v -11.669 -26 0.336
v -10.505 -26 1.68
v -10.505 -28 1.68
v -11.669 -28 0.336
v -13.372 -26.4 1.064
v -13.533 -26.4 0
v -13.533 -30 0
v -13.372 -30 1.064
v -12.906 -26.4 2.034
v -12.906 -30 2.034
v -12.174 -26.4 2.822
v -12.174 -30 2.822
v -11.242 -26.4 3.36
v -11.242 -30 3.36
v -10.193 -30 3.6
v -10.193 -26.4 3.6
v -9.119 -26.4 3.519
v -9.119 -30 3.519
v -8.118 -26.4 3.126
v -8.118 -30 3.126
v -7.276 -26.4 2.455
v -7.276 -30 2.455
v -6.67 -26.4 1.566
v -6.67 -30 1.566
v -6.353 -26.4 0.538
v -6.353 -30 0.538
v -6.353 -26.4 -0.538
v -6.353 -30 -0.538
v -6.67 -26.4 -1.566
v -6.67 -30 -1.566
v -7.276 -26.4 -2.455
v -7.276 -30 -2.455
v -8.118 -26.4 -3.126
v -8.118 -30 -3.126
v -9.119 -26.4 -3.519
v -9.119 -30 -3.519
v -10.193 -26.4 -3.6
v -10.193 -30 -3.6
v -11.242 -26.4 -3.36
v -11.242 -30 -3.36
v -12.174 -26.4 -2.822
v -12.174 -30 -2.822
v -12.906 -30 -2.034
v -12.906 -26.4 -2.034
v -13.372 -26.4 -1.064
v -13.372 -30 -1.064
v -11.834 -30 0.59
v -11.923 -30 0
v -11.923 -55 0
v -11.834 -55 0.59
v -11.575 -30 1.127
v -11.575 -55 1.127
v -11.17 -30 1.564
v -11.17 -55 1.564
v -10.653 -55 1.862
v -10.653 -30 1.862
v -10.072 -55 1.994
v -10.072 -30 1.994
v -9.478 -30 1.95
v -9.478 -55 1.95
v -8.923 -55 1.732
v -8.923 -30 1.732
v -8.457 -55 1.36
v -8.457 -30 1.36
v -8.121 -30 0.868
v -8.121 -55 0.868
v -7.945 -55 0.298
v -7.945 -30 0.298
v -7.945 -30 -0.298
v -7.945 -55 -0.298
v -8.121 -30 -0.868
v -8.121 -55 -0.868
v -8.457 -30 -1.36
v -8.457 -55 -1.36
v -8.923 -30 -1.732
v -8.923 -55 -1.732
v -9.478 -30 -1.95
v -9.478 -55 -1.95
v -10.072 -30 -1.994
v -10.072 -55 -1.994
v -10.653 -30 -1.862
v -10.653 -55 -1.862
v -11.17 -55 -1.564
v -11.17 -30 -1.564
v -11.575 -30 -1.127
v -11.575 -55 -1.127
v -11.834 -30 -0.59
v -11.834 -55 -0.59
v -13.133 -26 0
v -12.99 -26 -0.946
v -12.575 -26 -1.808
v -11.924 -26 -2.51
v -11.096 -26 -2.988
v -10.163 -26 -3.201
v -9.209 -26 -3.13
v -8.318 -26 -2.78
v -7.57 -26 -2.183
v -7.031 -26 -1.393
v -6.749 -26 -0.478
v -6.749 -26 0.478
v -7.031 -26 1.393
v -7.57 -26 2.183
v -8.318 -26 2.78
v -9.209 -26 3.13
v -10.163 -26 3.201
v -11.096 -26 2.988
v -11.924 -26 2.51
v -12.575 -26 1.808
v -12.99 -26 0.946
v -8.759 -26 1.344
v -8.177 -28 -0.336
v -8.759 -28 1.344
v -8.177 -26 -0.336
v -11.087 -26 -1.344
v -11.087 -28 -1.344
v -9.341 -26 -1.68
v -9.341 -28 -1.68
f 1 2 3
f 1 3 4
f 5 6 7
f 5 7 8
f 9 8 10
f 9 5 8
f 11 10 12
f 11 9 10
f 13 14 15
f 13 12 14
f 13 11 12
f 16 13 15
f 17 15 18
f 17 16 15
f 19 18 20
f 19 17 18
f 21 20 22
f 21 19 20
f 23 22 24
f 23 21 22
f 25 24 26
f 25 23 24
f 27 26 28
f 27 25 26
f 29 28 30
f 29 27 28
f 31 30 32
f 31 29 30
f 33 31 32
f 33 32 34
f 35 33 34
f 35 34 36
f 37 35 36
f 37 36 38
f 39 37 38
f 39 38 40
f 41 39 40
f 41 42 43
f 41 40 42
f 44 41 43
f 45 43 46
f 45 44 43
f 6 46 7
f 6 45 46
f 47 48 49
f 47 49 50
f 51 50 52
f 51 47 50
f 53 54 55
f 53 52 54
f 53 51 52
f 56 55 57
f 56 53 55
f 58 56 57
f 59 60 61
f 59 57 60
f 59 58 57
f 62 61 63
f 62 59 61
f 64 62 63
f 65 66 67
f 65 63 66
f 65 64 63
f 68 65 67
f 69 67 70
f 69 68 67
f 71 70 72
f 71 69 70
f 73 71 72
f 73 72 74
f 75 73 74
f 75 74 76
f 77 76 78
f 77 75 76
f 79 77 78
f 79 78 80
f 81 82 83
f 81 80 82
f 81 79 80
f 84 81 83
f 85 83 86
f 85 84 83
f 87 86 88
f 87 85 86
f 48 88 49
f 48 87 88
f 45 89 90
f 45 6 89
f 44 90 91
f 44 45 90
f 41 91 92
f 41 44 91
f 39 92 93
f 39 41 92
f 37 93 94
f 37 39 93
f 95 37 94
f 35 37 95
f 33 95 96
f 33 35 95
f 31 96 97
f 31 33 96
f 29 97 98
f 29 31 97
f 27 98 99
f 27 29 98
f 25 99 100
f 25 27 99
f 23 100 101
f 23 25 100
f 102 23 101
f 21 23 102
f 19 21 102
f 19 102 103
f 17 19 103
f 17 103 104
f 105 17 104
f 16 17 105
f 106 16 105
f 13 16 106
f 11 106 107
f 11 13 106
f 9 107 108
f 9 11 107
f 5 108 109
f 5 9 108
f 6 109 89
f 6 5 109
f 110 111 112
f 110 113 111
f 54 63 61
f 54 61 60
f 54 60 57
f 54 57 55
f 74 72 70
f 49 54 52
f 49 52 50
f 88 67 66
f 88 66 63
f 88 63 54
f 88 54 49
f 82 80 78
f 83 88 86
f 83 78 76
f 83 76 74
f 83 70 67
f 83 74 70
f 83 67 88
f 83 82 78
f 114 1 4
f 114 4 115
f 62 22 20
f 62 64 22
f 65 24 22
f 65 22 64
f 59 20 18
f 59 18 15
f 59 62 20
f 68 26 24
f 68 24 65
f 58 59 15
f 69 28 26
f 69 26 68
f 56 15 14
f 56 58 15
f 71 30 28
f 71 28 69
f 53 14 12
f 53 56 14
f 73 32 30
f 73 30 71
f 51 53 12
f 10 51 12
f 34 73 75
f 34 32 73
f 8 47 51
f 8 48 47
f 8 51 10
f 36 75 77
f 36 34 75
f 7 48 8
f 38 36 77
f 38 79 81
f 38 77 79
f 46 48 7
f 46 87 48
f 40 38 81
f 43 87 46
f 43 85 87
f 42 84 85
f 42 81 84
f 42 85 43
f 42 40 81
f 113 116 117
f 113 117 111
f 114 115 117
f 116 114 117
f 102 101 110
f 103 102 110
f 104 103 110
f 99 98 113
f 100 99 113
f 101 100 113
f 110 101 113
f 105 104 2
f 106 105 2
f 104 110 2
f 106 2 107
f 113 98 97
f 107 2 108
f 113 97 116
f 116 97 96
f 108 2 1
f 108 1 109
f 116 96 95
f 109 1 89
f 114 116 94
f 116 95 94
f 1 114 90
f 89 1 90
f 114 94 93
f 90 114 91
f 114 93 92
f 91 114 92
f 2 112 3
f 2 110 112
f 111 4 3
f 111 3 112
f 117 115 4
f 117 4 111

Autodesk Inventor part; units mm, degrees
ref_plane "YZ Plane" through (0, 0, 0) normal (1, 0, 0) x (0, 1, 0)
ref_plane "XZ Plane" through (0, 0, 0) normal (0, 1, 0) x (-1, 0, 0)
ref_plane "XY Plane" through (0, 0, 0) normal (0, 0, 1) x (1, 0, 0)
sketch "Sketch1" plane through (0, 0, 0) normal (0, 0, 1) x (1, 0, 0)
  line L0 (-9.9228, -30) -> (-13.5328, -30)
  line L1 (-13.5328, -30) -> (-13.5328, -26)
  line L2 (-13.5328, -26) -> (-9.9228, -26)
  line L3 (-9.9228, -26) -> (-9.9228, -30)
  line L4 (-9.9228, -30) -> (-9.9228, -55)
  line L5 (-9.9228, -55) -> (-11.9228, -55)
  line L6 (-11.9228, -55) -> (-11.9228, -30)
  point P0 (0, 0)
  dimension "d0" = 3.61
  dimension "d1" = 4
  dimension "d3" = 2
  dimension "d16" = 25
revolve "Revolution1" add sketch "Sketch1" angle 360 about axis through (-9.9228, -30, 0) along (0, -1, 0)
chamfer "Chamfer1" distance 0.4 angle 45 1 edges at (-6.3128, -26, 0)
sketch "Boceto2" plane through (-9.9228, -26, 0) normal (0, 1, 0) x (1, 0, 0)
  line L0 (1.1641, -1.3443) -> (-0.5821, -1.6803)
  line L1 (-0.5821, -1.6803) -> (-1.7462, -0.336)
  line L2 (-1.7462, -0.336) -> (-1.1641, 1.3443)
  line L3 (-1.1641, 1.3443) -> (0.5821, 1.6803)
  line L4 (0.5821, 1.6803) -> (1.7462, 0.336)
  line L5 (1.7462, 0.336) -> (1.1641, -1.3443)
  point P0 (9.9228, 0)
  point P1 (0, 0)
  dimension "d11" = 3.08
extrude "Extrusión1" cut sketch "Boceto2" against normal blind 2
thread "Rosca1" size "M4x0.7" class "6g" standard "ISO Metric profile" length 430
properties part number "Tornillo Allen cabeza cilindrica M4x25mm"
